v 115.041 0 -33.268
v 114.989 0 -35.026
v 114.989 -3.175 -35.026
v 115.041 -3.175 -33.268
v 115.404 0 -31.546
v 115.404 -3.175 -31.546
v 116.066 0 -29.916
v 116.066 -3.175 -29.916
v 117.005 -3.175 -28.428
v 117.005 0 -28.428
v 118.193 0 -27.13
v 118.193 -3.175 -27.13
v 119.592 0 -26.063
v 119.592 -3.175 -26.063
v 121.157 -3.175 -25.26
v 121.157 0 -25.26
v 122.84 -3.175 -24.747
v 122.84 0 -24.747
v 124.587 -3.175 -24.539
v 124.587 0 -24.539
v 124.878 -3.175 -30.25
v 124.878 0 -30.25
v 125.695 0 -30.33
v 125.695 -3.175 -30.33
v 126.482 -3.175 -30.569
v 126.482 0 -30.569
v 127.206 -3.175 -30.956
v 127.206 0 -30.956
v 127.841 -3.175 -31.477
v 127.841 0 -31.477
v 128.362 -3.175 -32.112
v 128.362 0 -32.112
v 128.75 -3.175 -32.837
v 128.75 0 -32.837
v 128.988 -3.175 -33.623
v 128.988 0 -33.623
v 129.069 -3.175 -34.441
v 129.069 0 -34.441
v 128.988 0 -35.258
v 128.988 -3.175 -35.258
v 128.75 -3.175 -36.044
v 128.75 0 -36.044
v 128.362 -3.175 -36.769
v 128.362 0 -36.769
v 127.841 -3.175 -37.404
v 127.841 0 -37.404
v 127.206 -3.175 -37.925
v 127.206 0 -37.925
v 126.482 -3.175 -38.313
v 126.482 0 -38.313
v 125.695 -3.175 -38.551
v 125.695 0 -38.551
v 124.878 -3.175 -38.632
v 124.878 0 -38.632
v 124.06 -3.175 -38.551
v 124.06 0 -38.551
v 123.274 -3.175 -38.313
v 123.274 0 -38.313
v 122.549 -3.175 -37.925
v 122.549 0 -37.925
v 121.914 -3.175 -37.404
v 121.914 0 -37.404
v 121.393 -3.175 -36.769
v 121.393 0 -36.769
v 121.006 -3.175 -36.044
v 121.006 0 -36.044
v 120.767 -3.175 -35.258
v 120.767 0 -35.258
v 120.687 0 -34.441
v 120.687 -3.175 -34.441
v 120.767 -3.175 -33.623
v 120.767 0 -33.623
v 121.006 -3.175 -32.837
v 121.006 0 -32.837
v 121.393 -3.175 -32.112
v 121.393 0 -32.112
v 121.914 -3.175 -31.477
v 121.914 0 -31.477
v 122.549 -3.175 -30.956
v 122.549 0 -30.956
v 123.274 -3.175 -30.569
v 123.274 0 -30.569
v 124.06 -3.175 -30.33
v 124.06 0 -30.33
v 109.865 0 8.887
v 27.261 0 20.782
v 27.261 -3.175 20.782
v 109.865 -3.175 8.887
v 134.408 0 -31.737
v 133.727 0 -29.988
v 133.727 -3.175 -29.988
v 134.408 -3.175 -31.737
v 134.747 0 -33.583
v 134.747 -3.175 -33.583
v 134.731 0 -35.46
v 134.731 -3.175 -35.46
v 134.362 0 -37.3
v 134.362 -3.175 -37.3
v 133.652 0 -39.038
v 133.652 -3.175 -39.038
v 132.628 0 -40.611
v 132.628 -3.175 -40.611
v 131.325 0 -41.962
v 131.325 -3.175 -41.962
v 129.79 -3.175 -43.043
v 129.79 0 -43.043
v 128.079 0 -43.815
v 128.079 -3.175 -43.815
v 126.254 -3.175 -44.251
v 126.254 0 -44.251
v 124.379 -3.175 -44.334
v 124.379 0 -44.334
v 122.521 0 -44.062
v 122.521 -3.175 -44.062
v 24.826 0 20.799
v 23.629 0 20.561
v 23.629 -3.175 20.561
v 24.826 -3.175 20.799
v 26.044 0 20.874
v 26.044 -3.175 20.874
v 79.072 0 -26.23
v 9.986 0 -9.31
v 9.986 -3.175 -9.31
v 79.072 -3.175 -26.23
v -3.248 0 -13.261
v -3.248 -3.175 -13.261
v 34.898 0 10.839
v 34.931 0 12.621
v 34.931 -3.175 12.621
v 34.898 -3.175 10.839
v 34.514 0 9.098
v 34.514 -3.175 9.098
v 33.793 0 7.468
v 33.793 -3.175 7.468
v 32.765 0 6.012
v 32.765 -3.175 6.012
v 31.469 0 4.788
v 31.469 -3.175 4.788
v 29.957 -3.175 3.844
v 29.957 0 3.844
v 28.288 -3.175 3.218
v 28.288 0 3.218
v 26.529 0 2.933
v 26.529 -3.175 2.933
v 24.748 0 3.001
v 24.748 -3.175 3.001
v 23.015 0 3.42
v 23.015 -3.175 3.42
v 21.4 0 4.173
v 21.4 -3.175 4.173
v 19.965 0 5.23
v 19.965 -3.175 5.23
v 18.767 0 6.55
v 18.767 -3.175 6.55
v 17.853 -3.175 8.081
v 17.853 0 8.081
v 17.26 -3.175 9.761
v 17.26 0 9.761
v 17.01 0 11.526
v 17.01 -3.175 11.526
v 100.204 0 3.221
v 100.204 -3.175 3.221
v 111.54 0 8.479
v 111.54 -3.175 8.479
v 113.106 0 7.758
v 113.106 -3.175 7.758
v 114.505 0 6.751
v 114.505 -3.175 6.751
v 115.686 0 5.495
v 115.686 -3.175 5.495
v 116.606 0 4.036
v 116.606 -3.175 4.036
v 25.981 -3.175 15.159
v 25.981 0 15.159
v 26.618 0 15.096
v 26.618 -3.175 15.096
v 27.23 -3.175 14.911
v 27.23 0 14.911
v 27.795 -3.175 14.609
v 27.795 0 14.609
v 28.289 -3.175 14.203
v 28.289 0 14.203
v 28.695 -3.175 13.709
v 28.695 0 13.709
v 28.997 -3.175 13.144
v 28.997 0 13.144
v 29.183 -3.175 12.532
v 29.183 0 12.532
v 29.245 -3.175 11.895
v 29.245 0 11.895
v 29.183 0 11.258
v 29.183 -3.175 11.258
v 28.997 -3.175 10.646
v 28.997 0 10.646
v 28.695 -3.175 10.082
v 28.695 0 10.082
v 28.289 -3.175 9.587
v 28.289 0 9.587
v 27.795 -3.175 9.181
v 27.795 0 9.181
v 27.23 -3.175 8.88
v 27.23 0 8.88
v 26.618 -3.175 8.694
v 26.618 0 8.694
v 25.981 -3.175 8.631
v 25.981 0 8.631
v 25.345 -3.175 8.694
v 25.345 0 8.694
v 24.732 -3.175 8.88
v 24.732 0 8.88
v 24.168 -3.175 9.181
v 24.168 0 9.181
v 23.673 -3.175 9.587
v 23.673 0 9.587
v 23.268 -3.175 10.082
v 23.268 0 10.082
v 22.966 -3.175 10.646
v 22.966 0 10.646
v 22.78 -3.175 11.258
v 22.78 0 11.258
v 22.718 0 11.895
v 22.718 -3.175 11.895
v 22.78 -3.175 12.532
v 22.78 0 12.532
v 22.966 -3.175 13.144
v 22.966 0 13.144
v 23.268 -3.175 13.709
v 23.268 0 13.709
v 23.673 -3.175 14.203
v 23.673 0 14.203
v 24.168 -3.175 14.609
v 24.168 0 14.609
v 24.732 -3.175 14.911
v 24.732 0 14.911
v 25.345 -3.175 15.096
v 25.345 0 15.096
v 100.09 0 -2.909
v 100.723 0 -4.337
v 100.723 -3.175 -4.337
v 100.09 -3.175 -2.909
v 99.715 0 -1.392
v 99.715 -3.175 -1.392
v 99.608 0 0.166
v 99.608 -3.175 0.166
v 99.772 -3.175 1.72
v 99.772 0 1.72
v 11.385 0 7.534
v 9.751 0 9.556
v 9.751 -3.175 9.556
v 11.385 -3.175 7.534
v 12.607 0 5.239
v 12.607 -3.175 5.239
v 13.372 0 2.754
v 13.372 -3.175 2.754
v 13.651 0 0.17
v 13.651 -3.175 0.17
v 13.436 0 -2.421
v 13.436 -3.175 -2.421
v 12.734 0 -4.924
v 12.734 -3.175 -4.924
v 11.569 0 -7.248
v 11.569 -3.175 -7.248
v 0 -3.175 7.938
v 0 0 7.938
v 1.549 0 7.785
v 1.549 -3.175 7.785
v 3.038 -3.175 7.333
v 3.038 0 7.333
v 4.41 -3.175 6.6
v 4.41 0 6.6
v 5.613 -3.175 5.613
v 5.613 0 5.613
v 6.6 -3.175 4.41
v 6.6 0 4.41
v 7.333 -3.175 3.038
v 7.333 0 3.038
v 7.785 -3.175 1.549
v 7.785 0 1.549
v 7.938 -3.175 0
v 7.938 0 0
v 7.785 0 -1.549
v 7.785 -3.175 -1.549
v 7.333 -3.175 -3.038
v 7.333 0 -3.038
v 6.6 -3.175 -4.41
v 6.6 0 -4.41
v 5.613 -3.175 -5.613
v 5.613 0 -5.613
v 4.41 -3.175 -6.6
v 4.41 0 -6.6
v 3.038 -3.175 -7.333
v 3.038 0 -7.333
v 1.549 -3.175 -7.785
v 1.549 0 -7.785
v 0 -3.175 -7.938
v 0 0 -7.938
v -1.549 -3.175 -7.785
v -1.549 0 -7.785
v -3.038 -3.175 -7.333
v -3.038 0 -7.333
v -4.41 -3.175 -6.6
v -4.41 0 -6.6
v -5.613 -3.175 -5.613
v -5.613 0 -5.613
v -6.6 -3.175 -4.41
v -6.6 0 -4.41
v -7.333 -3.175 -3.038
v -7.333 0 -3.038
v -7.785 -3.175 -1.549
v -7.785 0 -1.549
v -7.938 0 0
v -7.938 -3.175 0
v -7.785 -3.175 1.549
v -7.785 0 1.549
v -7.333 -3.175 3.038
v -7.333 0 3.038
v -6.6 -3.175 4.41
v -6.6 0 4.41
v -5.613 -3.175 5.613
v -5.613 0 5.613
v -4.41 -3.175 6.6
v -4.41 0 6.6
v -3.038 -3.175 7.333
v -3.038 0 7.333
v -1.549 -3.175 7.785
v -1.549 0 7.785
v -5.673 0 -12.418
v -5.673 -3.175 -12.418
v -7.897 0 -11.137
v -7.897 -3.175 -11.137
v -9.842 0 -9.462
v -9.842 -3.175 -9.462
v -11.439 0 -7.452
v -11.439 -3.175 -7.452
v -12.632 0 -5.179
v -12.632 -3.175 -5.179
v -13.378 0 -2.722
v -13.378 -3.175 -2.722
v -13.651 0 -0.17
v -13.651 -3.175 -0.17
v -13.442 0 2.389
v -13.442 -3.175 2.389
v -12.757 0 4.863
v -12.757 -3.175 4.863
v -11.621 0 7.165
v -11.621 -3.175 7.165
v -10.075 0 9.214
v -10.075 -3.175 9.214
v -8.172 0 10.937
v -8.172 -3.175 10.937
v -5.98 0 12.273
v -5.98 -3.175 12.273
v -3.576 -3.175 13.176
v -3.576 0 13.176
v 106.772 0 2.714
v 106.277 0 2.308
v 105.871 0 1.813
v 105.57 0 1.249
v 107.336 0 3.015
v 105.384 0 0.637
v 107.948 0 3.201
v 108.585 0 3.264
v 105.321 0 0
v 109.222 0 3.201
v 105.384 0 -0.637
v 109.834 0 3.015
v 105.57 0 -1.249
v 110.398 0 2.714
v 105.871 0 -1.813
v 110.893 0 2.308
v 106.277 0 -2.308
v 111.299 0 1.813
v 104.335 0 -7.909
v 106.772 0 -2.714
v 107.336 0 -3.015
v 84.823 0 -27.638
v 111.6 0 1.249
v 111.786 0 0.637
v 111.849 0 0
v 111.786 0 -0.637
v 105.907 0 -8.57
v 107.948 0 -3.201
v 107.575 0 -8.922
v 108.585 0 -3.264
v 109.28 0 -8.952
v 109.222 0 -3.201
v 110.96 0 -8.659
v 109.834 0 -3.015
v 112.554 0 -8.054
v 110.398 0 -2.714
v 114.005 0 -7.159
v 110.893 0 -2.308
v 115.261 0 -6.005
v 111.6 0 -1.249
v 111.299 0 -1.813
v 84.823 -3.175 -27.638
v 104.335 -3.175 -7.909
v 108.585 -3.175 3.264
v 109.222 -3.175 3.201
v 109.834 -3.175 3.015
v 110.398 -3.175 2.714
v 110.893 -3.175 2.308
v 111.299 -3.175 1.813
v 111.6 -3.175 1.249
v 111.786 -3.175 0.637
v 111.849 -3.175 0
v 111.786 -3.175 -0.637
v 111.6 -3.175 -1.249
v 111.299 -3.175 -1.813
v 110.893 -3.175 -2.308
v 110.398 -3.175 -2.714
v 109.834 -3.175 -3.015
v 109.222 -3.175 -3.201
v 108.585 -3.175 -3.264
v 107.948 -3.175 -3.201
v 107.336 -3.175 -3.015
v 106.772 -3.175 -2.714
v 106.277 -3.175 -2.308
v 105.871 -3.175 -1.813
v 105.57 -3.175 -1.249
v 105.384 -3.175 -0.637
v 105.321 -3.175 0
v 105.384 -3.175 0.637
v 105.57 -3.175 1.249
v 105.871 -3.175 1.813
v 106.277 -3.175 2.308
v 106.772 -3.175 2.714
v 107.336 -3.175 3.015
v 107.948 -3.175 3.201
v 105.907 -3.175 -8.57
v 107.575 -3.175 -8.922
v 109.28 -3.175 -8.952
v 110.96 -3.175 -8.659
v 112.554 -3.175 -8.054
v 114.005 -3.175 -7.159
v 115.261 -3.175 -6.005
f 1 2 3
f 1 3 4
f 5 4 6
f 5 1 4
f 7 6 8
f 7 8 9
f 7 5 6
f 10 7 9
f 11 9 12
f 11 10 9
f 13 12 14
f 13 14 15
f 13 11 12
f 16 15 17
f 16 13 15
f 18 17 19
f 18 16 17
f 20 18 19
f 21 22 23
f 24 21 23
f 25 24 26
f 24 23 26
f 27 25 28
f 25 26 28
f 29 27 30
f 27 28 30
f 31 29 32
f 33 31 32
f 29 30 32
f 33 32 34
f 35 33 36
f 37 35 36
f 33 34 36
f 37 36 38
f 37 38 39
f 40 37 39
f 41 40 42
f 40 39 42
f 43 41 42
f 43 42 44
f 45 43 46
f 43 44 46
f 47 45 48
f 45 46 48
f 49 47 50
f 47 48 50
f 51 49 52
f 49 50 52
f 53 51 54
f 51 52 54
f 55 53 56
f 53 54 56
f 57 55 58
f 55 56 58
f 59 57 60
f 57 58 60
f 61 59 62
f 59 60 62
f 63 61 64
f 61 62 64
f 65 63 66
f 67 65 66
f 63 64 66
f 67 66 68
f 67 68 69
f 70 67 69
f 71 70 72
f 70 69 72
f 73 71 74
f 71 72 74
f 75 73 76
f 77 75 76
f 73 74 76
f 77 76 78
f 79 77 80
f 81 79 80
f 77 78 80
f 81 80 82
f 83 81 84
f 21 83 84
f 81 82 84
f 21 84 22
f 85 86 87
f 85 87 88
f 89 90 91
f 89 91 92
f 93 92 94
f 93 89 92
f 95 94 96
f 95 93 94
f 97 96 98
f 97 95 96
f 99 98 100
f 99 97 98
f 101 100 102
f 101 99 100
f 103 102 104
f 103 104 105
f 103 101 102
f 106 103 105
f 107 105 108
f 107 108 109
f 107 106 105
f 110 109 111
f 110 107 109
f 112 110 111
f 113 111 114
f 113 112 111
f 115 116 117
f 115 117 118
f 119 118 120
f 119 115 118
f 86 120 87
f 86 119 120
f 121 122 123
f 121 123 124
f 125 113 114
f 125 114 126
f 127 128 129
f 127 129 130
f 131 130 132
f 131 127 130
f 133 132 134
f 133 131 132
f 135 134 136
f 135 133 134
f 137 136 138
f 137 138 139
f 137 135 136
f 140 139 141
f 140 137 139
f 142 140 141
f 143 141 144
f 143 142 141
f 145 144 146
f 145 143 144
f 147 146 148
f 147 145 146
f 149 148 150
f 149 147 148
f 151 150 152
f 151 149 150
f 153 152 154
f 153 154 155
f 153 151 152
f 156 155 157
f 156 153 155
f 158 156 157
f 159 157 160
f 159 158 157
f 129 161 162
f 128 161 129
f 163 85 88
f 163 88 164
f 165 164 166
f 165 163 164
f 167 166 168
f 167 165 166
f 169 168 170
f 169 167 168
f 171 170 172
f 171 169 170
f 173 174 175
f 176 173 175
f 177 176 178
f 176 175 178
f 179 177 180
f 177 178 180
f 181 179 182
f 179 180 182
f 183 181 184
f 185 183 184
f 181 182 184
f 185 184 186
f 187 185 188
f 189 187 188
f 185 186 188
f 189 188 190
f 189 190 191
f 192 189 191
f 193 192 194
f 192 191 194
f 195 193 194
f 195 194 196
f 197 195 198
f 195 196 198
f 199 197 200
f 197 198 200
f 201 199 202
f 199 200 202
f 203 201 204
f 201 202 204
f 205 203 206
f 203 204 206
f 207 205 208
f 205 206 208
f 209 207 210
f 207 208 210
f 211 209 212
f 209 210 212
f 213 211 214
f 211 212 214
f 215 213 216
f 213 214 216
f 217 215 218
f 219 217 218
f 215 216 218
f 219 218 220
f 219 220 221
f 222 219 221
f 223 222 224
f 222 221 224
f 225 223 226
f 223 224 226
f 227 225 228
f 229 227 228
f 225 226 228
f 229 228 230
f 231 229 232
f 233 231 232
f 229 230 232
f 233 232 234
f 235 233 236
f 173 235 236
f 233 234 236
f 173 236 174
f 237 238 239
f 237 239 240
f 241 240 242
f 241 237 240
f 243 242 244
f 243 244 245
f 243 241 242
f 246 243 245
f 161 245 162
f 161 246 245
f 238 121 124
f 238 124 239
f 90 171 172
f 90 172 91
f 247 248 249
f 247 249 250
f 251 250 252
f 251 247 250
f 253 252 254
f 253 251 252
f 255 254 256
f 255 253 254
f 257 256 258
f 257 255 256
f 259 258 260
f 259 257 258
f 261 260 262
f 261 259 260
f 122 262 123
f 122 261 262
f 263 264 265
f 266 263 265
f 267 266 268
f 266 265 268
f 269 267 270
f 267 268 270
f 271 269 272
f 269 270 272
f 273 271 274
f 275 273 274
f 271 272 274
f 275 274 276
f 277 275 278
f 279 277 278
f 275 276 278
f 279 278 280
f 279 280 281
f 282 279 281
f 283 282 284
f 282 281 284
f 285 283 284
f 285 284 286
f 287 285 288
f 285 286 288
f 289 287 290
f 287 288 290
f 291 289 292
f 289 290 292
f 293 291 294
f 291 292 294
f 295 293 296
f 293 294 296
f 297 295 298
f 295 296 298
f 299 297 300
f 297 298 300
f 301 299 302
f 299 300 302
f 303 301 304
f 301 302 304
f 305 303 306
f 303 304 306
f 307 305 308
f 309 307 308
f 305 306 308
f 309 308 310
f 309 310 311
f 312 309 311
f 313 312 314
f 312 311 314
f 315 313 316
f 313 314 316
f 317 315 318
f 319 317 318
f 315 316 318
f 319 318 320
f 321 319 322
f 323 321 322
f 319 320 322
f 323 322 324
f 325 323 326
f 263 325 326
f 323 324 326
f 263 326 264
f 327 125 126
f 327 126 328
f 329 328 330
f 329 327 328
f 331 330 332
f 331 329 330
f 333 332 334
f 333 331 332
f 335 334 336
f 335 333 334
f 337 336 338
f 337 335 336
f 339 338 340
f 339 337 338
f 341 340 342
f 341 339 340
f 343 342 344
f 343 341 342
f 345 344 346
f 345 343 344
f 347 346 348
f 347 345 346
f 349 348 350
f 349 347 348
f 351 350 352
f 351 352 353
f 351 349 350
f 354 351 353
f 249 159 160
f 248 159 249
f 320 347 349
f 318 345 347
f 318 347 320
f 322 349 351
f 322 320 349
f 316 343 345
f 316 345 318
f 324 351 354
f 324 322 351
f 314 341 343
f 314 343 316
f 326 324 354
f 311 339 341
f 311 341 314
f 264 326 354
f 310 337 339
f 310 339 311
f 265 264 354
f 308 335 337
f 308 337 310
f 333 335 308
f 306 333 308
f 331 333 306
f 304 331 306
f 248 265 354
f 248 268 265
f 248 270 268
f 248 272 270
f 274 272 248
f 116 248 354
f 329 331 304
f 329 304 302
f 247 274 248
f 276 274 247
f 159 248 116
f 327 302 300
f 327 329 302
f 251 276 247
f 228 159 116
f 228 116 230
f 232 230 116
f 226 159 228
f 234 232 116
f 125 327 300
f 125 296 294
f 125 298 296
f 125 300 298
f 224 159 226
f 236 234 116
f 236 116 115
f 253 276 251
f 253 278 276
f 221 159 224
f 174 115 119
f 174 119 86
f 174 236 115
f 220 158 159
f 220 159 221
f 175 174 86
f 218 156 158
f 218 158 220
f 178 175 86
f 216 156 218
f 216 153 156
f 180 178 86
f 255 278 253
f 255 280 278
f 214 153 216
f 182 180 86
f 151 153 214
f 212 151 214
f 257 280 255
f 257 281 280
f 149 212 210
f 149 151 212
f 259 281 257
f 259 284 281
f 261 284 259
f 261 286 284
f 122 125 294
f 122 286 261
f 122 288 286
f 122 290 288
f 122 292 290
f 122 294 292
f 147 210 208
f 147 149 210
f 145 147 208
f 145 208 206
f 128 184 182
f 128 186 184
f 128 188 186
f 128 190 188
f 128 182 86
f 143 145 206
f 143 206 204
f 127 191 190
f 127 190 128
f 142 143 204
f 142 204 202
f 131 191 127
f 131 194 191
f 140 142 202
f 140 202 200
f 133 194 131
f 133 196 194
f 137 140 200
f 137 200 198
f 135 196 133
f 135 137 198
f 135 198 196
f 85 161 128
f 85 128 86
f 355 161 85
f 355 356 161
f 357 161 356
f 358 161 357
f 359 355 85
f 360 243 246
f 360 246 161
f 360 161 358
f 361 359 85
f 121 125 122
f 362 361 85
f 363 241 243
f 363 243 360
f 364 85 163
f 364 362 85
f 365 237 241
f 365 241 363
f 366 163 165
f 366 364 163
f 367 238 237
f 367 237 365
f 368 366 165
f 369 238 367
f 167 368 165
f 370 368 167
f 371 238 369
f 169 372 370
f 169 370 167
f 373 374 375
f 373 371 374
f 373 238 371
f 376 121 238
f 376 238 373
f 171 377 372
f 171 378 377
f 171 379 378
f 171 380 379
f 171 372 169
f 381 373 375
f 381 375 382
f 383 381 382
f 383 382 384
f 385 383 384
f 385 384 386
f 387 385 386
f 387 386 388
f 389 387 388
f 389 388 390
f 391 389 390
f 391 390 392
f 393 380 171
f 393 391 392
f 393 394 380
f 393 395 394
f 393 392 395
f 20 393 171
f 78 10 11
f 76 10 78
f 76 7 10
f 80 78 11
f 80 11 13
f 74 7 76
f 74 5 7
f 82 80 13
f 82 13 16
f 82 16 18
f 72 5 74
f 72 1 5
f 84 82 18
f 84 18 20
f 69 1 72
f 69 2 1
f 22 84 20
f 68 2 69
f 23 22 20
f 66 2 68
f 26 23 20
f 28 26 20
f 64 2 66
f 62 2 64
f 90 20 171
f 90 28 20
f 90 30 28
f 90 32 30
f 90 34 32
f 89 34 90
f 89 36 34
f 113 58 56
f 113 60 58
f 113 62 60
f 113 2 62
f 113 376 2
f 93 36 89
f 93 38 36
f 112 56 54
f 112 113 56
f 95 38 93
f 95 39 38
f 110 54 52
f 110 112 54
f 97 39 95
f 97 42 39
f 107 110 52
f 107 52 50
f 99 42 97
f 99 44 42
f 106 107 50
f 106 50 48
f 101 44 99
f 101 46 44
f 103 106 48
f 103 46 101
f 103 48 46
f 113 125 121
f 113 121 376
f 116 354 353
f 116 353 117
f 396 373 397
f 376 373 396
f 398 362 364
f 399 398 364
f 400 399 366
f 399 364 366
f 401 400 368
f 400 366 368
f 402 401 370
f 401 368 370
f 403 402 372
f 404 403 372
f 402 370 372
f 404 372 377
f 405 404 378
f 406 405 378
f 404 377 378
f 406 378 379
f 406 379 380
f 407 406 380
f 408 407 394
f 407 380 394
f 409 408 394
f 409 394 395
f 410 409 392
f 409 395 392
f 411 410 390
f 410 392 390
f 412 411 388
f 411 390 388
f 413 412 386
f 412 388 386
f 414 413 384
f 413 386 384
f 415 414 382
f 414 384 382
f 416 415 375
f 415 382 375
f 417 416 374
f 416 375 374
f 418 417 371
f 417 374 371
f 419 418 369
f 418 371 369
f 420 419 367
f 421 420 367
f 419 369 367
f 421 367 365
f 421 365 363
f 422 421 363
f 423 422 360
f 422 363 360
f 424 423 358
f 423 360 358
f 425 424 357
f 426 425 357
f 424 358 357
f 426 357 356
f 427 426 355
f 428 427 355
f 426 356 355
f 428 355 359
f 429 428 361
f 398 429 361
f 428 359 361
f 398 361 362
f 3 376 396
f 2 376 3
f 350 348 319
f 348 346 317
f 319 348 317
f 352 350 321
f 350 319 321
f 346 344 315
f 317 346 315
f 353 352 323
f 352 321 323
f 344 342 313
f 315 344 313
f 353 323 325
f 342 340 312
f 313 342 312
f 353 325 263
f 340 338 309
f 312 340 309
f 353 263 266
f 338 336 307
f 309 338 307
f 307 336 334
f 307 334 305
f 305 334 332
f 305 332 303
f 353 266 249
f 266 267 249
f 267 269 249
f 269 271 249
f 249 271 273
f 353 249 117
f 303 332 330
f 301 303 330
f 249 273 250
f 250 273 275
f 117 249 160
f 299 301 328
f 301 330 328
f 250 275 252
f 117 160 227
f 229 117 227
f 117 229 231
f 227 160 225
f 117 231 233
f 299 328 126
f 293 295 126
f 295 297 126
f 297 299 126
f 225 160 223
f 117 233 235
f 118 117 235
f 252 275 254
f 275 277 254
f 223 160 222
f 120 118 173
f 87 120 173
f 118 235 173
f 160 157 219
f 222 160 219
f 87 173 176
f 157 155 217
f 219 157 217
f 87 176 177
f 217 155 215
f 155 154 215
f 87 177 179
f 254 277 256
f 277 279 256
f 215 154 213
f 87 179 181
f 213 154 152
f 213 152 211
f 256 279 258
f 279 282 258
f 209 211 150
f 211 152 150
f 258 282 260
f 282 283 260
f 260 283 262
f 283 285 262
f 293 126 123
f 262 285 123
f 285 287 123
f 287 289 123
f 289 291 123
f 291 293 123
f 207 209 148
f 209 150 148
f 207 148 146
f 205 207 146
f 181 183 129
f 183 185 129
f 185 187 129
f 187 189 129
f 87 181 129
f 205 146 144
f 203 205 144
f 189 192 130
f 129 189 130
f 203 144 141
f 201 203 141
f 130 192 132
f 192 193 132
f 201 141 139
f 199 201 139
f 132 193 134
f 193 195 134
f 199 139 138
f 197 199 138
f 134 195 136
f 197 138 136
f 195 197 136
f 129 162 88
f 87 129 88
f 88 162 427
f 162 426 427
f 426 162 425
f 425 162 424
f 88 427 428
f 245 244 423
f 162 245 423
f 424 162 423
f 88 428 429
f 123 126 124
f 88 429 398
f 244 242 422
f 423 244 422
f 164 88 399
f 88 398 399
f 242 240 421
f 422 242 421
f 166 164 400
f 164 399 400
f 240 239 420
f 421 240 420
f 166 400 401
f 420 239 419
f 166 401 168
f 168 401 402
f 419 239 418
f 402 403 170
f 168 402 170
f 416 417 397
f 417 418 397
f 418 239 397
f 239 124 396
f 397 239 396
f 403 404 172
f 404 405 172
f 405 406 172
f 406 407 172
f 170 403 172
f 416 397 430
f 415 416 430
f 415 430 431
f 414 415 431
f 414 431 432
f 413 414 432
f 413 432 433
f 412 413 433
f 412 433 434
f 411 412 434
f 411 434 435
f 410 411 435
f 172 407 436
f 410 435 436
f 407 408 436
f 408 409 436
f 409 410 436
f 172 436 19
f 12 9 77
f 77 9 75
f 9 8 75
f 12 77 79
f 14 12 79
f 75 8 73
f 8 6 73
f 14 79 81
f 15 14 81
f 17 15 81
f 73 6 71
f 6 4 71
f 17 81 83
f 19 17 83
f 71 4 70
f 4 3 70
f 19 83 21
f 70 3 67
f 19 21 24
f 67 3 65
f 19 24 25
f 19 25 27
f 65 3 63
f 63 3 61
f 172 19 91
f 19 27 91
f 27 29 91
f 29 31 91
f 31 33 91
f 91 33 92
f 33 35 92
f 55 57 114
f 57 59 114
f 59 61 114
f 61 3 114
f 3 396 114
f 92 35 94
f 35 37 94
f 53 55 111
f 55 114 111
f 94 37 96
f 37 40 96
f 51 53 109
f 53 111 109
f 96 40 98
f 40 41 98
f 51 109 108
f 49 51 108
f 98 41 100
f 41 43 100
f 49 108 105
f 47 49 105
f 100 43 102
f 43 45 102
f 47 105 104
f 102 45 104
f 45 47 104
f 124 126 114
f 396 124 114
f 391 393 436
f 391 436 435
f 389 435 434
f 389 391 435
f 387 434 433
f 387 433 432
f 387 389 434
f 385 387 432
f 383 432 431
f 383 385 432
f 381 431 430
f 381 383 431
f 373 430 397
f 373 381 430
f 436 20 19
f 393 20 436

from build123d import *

# Parameters (mm, degrees)
SKETCH1_R           = 3.2639
SKETCH1_R_2         = 7.9375
SKETCH1_R_3         = 4.191
BOSS_EXTRUDE4_DEPTH = 3.175


with BuildPart() as part:
    # Sketch1 → Boss-Extrude4 (new body)
    with BuildSketch(Plane(origin=(0, 0, 0), x_dir=(1, 0, 0), z_dir=(0, 1, 0))):
        with BuildLine():
            Line((27.261215437, -20.782448937), (109.864793621, -8.887225298))
            ThreePointArc((109.864793621, -8.887225298), (113.829824864, -7.2878294), (116.60566957, -4.036025875))
            Line((116.60566957, -4.036025875), (133.726592386, 29.98785526))
            ThreePointArc((133.726592386, 29.98785526), (132.627611185, 40.61059676), (122.521356715, 44.06226552))
            Line((122.521356715, 44.06226552), (-3.247611444, 13.260609947))
            ThreePointArc((-3.247611444, 13.260609947), (-13.651443786, 0.16981992), (-3.576471569, -13.175720374))
            Line((-3.576471569, -13.175720374), (23.629267956, -20.560557875))
            ThreePointArc((23.629267956, -20.560557875), (25.433883661, -20.857413504), (27.261215437, -20.782448937))
        make_face()
        with Locations(Location((25.981421816, -11.895223639, 0), (0, 0, 270))):
            Circle(SKETCH1_R, mode=Mode.SUBTRACT)
        with Locations(Location((0, 0, 0), (0, 0, 270))):
            Circle(SKETCH1_R_2, mode=Mode.SUBTRACT)
        with BuildLine():
            ThreePointArc((100.723144875, 4.337266328), (99.62721378, 0.615395192), (100.203869733, -3.221381793))
            Line((100.203869733, -3.221381793), (34.930946987, -12.620926349))
            ThreePointArc((34.930946987, -12.620926349), (26.528959971, -2.933033774), (17.010113752, -11.526066709))
            Line((17.010113752, -11.526066709), (9.750952301, -9.555610157))
            ThreePointArc((9.750952301, -9.555610157), (13.651443786, -0.16981992), (9.985636063, 9.310092839))
            Line((9.985636063, 9.310092839), (79.071831614, 26.229760952))
            Line((79.071831614, 26.229760952), (100.723144875, 4.337266328))
        make_face(mode=Mode.SUBTRACT)
        with Locations(Location((108.585, 0, 0), (0, 0, 270))):
            Circle(SKETCH1_R, mode=Mode.SUBTRACT)
        with BuildLine():
            Line((104.335087932, 7.90941797), (84.823475635, 27.638376771))
            Line((84.823475635, 27.638376771), (114.98908268, 35.026134276))
            ThreePointArc((114.98908268, 35.026134276), (117.570132445, 27.752761279), (124.58688197, 24.538885311))
            Line((124.58688197, 24.538885311), (115.260501822, 6.004858086))
            ThreePointArc((115.260501822, 6.004858086), (110.126982004, 8.845503757), (104.335087932, 7.90941797))
        make_face(mode=Mode.SUBTRACT)
        with Locations(Location((124.877763158, 34.440613651, 0), (0, 0, 270))):
            Circle(SKETCH1_R_3, mode=Mode.SUBTRACT)
    extrude(amount=-BOSS_EXTRUDE4_DEPTH)


solid = part.part
